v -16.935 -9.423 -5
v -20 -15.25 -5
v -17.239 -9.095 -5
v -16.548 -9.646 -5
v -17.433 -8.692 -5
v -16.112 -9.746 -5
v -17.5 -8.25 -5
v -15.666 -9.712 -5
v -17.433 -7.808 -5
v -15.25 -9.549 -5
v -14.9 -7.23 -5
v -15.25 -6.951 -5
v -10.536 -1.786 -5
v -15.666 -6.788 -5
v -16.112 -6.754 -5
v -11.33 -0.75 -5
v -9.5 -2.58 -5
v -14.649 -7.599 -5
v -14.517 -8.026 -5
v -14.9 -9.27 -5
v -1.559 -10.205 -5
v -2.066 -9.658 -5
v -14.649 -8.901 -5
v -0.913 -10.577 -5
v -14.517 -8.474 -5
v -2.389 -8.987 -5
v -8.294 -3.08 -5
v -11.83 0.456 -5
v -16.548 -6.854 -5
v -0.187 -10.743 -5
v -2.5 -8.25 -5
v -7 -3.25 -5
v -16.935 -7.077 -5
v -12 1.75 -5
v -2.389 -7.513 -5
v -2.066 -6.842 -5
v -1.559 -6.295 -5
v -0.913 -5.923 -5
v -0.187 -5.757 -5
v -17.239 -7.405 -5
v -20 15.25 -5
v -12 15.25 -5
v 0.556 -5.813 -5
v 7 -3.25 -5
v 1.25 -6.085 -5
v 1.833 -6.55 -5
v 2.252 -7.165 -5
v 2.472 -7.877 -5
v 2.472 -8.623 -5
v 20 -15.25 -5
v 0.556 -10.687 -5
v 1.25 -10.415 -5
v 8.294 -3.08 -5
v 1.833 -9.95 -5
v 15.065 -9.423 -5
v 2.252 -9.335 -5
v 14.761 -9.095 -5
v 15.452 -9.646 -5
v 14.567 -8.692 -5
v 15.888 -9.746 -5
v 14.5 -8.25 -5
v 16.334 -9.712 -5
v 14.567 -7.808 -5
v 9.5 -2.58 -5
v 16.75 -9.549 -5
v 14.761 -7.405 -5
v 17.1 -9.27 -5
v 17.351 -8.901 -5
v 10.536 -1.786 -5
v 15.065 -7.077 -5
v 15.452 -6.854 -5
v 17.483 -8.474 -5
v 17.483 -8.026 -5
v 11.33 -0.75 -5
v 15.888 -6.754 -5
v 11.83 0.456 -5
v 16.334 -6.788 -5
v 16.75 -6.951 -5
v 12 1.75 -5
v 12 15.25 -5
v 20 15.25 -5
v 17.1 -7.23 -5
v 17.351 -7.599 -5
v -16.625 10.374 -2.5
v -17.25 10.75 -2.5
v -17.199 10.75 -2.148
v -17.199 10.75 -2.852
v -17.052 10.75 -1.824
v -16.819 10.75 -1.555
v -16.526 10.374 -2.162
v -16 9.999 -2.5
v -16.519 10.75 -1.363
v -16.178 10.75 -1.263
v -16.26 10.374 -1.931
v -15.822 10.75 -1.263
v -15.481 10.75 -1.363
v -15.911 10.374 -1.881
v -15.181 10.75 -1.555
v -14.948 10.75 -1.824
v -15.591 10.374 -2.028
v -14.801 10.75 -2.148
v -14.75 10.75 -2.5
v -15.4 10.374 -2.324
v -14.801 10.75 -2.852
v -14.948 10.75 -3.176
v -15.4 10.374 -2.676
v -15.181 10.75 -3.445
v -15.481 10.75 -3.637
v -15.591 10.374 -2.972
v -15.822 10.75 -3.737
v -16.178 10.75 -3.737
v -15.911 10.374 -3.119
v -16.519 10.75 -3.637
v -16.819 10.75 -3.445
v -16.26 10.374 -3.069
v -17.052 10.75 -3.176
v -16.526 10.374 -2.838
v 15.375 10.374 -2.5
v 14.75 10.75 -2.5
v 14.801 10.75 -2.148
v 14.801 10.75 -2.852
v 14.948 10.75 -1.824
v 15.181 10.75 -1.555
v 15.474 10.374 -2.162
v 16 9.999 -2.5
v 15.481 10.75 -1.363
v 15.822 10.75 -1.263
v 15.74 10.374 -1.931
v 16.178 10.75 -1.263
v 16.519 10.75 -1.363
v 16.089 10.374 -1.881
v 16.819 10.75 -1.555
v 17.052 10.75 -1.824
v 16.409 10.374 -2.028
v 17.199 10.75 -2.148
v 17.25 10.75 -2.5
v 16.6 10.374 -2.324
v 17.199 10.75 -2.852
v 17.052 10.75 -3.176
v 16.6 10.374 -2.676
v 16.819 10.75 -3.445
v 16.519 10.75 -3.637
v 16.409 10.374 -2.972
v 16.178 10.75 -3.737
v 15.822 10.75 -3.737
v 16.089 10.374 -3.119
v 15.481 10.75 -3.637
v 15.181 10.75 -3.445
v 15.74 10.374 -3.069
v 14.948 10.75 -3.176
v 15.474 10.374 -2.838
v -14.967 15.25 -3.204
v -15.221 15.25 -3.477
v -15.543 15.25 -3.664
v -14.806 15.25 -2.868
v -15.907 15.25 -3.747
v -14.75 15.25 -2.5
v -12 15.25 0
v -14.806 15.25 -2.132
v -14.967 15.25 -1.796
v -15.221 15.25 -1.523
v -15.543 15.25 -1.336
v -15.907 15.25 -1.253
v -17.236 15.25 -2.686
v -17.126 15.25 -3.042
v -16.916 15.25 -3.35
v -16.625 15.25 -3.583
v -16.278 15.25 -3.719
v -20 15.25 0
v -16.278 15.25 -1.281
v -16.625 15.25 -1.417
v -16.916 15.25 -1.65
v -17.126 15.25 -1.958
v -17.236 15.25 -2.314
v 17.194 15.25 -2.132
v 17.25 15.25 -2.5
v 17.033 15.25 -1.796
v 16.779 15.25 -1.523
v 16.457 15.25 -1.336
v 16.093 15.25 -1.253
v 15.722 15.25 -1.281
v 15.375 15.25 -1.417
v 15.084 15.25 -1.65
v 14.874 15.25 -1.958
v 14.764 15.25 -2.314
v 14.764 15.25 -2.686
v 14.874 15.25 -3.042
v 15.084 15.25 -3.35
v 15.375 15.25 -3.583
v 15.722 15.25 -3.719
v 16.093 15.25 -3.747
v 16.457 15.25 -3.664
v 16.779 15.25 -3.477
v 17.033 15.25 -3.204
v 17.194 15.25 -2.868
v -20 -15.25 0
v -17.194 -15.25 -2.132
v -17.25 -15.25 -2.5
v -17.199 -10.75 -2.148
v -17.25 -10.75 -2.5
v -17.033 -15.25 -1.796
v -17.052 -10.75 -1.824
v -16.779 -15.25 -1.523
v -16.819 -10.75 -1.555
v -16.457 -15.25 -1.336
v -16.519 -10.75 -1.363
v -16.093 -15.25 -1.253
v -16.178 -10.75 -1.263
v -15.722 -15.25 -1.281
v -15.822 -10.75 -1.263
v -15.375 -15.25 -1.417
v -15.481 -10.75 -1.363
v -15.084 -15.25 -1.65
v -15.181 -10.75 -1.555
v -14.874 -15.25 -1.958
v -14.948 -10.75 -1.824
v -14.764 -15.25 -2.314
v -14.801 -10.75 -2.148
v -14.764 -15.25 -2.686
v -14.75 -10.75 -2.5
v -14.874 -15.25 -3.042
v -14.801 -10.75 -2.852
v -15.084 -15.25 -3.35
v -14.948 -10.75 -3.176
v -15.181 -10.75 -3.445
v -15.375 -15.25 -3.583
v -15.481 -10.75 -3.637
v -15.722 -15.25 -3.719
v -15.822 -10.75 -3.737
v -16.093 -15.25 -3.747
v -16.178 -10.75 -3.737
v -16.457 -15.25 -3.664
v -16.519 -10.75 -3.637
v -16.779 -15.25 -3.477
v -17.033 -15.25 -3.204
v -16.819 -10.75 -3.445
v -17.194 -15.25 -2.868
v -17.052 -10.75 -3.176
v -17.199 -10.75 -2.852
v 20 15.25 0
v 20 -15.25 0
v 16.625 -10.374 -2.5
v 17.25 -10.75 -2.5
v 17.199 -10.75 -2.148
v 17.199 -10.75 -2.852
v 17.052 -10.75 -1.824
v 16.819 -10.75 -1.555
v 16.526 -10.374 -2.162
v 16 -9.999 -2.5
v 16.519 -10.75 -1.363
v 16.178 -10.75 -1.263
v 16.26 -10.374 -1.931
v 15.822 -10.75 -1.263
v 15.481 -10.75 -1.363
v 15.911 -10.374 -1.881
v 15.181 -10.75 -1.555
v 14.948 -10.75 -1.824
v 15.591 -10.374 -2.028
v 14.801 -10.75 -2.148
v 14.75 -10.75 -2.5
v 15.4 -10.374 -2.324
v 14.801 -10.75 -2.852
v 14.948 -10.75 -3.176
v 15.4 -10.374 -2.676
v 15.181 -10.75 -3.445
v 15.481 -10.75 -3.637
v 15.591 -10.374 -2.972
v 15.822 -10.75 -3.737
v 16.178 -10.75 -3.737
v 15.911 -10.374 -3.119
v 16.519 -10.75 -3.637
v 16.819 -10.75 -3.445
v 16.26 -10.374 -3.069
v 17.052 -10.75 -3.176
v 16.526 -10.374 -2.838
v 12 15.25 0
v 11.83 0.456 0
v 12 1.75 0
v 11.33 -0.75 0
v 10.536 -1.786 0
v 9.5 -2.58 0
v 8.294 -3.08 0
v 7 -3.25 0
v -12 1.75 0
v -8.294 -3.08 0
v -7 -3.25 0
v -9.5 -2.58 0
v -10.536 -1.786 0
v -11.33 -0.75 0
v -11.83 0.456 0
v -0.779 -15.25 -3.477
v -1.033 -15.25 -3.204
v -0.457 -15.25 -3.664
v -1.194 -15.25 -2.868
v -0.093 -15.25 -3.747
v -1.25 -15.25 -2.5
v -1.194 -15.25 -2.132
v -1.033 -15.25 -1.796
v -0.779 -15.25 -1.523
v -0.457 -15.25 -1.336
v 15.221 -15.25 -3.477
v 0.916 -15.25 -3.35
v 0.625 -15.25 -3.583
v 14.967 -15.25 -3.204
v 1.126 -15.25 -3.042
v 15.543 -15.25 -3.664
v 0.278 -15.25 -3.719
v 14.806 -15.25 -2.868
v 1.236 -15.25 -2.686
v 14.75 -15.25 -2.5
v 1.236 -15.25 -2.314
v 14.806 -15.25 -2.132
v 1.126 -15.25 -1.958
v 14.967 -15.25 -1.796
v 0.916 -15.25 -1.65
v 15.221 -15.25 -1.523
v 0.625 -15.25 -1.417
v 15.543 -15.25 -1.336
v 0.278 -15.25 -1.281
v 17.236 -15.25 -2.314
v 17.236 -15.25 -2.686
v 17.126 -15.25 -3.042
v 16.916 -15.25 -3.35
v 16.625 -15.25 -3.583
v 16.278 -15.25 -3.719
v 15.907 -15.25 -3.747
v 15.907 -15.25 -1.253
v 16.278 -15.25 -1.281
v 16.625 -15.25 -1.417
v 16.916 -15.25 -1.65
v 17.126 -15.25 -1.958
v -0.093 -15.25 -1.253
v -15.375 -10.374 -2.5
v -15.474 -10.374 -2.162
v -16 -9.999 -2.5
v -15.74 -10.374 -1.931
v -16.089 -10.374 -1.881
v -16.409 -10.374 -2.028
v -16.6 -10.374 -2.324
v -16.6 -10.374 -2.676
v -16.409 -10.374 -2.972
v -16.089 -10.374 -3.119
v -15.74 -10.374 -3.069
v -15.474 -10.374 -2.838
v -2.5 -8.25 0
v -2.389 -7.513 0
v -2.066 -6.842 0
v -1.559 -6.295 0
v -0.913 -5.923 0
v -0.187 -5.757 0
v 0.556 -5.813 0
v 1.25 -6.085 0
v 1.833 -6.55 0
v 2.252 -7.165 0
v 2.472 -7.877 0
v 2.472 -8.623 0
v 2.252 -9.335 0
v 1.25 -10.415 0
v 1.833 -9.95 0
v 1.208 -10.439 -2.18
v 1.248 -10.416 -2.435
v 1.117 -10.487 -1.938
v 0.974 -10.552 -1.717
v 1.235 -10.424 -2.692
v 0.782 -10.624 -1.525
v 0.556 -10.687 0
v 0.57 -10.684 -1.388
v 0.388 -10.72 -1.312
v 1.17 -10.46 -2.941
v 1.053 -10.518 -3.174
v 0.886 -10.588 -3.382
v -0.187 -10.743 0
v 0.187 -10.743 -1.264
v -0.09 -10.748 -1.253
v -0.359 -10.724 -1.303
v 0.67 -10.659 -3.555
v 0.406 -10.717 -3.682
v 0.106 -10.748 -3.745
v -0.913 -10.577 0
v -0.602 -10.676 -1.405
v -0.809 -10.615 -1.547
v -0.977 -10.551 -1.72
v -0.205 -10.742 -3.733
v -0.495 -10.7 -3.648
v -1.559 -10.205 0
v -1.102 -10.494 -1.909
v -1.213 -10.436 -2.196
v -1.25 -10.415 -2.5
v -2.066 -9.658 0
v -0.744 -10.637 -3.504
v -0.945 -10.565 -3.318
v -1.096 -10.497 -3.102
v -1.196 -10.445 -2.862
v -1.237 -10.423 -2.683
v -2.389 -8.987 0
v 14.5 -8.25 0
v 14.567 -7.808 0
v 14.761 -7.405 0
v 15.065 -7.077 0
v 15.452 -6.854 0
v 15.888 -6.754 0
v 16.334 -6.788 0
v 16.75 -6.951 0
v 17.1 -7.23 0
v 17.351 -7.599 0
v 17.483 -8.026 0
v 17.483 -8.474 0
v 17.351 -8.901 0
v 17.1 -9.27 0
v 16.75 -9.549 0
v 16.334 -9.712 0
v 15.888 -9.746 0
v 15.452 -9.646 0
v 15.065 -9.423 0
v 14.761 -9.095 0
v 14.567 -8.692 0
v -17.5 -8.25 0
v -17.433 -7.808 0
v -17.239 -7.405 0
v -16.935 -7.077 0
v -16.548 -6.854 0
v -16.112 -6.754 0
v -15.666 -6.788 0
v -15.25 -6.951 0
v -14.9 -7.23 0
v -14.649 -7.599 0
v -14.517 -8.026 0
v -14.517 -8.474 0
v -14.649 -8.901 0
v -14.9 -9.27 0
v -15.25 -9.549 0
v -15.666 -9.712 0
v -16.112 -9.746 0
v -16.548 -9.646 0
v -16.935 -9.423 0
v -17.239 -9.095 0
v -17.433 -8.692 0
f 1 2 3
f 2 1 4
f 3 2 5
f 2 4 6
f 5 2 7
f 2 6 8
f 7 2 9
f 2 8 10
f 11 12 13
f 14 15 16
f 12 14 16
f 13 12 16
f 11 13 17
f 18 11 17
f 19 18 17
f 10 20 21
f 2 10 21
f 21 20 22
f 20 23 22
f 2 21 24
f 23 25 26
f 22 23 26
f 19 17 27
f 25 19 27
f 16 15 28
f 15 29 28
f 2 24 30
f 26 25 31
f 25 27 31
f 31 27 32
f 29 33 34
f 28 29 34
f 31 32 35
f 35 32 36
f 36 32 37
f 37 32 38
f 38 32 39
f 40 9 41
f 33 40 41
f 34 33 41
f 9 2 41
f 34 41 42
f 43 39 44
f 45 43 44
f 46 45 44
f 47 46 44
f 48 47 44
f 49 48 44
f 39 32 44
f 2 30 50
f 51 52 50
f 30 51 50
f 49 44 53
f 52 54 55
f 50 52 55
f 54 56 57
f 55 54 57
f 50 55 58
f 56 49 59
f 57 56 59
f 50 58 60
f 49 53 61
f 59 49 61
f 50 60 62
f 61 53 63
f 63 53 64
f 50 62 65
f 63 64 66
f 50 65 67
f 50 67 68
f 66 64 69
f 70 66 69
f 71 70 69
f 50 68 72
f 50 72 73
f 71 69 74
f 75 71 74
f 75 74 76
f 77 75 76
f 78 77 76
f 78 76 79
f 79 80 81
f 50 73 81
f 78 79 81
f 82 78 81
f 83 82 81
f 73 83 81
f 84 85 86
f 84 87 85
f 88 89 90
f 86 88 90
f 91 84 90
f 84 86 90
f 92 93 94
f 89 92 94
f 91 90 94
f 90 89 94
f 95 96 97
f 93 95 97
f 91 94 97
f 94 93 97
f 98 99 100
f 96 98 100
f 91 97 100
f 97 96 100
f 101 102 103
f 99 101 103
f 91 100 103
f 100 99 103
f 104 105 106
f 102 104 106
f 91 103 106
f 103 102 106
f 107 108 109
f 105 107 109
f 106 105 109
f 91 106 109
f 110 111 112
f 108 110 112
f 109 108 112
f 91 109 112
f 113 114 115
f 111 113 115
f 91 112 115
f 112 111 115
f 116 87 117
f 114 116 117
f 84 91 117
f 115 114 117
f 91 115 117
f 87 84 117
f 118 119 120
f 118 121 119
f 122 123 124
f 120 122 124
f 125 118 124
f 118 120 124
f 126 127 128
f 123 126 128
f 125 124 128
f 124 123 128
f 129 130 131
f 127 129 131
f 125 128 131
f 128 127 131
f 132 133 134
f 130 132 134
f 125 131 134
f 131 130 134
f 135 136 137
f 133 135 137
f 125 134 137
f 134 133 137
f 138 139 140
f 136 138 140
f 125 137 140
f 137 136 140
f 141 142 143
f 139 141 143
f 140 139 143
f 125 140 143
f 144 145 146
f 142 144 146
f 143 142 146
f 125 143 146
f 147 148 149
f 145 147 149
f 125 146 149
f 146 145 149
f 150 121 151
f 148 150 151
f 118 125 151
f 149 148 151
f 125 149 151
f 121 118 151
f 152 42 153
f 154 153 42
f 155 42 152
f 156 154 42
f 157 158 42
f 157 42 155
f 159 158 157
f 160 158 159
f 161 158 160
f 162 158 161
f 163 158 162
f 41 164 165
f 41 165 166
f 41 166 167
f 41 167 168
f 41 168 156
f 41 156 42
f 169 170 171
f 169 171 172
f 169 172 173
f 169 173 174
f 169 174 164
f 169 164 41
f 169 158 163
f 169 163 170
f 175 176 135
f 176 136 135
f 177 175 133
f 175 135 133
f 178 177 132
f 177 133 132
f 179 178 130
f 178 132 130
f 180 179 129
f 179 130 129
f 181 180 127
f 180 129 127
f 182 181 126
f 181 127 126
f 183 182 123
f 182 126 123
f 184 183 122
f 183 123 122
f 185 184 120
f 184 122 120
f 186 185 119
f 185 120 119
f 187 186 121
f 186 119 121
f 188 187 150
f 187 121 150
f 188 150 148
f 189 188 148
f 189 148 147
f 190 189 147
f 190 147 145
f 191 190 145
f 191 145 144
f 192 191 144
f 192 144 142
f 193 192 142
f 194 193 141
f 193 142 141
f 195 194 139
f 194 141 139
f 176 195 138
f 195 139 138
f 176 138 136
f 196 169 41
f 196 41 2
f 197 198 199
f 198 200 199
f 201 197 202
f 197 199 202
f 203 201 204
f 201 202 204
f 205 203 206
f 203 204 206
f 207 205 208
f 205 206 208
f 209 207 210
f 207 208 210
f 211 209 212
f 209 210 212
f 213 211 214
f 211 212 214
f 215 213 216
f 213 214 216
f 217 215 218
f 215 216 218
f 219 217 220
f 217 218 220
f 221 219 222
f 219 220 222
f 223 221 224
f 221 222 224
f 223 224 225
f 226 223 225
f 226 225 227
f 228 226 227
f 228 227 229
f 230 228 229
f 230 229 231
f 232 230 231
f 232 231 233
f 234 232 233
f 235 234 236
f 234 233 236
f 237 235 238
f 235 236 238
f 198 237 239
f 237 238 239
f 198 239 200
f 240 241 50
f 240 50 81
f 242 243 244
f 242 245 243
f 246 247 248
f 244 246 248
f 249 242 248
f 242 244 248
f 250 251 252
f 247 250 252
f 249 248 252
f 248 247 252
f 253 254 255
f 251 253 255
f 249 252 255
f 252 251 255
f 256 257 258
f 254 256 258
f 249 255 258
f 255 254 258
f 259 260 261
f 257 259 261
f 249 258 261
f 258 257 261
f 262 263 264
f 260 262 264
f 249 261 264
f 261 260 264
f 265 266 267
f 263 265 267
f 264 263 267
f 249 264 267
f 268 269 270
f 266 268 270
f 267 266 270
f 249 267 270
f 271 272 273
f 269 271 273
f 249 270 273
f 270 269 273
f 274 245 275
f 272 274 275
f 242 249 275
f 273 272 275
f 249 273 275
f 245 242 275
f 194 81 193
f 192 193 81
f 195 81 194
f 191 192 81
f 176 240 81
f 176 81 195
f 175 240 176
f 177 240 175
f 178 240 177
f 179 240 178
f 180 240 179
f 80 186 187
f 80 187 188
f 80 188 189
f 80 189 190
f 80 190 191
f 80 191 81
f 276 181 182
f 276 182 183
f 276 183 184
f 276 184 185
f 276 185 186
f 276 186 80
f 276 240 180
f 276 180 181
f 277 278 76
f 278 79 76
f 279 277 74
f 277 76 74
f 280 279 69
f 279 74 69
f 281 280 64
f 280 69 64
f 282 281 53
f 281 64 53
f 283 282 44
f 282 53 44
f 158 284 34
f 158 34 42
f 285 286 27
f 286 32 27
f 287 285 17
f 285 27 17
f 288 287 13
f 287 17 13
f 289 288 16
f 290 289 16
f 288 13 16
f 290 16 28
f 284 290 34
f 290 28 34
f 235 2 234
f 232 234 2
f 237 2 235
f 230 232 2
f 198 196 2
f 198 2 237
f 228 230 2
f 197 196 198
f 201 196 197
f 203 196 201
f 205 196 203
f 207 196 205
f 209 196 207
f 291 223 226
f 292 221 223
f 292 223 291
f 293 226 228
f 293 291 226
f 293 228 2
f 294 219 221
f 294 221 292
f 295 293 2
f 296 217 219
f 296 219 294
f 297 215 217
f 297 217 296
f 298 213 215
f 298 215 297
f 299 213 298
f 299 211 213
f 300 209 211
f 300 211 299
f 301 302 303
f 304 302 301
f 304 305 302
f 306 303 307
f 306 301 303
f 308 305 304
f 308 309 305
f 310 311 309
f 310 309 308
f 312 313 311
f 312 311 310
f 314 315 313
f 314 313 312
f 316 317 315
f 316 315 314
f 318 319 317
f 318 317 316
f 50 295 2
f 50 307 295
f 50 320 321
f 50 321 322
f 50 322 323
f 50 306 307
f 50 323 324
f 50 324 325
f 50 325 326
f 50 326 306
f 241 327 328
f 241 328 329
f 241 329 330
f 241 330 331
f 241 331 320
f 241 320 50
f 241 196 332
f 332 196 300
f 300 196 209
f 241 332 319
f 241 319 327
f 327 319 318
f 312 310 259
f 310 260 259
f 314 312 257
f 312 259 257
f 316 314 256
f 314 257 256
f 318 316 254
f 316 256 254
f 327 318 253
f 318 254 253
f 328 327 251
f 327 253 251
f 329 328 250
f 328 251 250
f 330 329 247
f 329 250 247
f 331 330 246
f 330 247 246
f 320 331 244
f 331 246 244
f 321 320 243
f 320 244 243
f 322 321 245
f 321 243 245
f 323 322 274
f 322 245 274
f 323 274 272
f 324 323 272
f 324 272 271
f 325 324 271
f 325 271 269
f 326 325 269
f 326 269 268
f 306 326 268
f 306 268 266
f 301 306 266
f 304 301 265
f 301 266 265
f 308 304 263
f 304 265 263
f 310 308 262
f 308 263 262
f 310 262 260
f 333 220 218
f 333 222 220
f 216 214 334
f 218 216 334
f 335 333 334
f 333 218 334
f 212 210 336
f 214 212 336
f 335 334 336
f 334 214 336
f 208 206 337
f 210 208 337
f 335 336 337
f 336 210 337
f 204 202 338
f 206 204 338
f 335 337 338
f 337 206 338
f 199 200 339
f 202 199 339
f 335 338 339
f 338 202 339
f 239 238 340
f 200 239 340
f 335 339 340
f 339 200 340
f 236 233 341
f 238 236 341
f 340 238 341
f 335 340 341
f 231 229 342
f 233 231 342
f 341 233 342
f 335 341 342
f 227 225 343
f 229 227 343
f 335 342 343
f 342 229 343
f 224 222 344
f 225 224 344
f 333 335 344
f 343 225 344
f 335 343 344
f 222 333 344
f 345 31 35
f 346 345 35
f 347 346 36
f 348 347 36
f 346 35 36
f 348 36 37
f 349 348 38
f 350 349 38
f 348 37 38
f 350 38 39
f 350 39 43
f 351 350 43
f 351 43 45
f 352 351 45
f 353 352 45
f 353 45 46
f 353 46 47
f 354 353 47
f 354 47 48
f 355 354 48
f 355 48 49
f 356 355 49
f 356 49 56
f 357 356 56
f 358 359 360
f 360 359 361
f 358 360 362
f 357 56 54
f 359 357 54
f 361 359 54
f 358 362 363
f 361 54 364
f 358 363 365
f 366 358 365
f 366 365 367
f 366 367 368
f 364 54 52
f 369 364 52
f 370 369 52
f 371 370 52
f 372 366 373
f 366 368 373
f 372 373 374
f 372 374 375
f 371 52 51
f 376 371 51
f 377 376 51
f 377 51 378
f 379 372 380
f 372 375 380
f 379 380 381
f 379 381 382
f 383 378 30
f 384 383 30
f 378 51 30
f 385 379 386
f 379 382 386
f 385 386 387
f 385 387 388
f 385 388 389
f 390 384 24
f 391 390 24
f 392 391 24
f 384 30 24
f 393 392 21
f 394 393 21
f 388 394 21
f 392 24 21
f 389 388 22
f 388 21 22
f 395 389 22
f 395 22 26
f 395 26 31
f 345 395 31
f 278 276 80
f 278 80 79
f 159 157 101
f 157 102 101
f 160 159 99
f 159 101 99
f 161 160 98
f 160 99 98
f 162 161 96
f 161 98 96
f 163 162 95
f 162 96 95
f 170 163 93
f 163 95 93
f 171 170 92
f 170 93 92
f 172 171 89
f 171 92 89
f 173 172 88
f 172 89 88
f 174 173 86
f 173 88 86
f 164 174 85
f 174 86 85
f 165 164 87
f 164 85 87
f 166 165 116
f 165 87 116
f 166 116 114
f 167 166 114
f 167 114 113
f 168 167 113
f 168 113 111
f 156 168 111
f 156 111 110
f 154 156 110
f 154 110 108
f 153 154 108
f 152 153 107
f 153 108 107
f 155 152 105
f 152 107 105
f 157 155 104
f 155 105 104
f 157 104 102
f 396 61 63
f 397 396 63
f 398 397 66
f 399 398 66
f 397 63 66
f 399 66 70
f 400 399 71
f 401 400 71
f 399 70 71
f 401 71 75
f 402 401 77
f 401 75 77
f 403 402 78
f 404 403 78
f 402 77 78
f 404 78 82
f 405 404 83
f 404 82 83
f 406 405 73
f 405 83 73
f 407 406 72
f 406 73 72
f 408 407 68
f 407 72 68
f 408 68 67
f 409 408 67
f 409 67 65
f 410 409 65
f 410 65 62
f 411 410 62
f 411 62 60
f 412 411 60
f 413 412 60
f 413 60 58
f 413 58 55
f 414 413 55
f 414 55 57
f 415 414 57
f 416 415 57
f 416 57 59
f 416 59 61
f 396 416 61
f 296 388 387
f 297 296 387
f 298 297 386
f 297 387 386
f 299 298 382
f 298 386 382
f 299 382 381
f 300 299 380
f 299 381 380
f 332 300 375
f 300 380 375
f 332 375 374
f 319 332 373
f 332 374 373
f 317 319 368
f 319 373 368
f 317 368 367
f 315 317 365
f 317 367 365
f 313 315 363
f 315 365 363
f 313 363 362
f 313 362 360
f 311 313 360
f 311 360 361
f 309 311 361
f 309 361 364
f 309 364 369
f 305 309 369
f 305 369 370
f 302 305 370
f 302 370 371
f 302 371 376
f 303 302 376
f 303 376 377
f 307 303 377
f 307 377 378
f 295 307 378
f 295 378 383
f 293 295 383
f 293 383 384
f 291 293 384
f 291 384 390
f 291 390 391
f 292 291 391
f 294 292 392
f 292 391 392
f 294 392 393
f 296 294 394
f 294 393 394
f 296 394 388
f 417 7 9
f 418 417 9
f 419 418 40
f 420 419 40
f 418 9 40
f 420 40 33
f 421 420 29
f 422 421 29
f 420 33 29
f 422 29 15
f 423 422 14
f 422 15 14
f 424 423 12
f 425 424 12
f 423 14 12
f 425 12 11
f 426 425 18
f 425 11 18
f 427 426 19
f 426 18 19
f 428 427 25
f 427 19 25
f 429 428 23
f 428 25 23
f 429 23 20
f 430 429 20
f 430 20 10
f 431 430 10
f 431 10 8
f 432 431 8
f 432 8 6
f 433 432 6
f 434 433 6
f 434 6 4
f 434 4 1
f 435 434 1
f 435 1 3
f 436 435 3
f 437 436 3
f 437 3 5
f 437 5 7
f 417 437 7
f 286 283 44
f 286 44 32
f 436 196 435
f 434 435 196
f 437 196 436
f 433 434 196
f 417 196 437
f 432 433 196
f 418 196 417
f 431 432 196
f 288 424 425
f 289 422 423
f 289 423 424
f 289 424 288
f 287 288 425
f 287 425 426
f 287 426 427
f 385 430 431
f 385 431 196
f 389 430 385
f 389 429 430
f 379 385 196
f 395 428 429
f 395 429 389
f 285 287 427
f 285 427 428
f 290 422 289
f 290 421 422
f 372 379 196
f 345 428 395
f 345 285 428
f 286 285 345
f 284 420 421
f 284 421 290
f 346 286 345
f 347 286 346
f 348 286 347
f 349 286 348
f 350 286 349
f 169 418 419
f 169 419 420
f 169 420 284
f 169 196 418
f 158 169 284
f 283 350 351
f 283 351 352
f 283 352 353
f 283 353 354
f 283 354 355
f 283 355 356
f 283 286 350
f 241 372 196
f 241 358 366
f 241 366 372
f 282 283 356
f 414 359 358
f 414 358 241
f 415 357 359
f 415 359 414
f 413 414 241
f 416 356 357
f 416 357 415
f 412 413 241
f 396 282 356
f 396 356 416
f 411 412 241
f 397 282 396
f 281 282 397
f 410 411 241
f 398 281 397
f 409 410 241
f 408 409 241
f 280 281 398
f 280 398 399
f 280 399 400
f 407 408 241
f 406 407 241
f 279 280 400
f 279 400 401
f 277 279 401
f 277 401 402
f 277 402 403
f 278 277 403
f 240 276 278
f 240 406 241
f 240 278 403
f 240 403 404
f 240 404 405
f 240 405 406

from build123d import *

# Parameters (mm, degrees)
F1_DEPTH       = 5
F2_R           = 5
F3_D           = 3
F6_D           = 2.5
F6_DEPTH       = 4.5
F6_TIP         = 0.7510757738
F6_ON_F5_D     = 2.5
F6_ON_F5_DEPTH = 4.5
F6_ON_F5_TIP   = 0.7510757738
F7_D           = 5
F8_D           = 2.5
F8_DEPTH       = 6
F8_TIP         = 0.7510757738


with BuildPart() as f1:
    # F0 (on Top) → F1 (new body)
    with BuildSketch(Plane.XY):
        Polygon((-20, -15.25), (20, -15.25), (20, 15.25), (12, 15.25), (12, -3.25), (-12, -3.25), (-12, 15.25), (-20, 15.25), align=None)
    extrude(amount=-F1_DEPTH)

    # F2
    f2_edges = [f1.edges().sort_by_distance(p)[0] for p in [
        (-12, -3.25, -2.5),
        (12, -3.25, -2.5),
    ]]
    fillet(f2_edges, radius=F2_R)

    # F3 (through all)
    with Locations(Plane.XY):
        with Locations((-16, -8.25), (16, -8.25)):
            Hole(F3_D / 2)

    # F6
    with Locations(Plane(origin=(0, 15.25, 0), x_dir=(-1, 0, 0), z_dir=(0, 1, 0))):
        with Locations((-16, -2.5), (16, -2.5)):
            Hole(F6_D / 2, depth=F6_DEPTH)
            with Locations((0, 0, -(F6_DEPTH + F6_TIP / 2))):  # 118° drill point
                Cone(0, F6_D / 2, F6_TIP, mode=Mode.SUBTRACT)

    # F6 on F5
    with Locations(Plane.XZ.offset(15.25)):
        with Locations((-16, -2.5), (16, -2.5)):
            Hole(F6_ON_F5_D / 2, depth=F6_ON_F5_DEPTH)
            with Locations((0, 0, -(F6_ON_F5_DEPTH + F6_ON_F5_TIP / 2))):  # 118° drill point
                Cone(0, F6_ON_F5_D / 2, F6_ON_F5_TIP, mode=Mode.SUBTRACT)

    # F7 (through all)
    with Locations(Plane.XY):
        with Locations((0, -8.25)):
            Hole(F7_D / 2)

    # F8
    with Locations(Plane.XZ.offset(15.25)):
        with Locations((0, -2.5)):
            Hole(F8_D / 2, depth=F8_DEPTH)
            with Locations((0, 0, -(F8_DEPTH + F8_TIP / 2))):  # 118° drill point
                Cone(0, F8_D / 2, F8_TIP, mode=Mode.SUBTRACT)


solid = f1.part
